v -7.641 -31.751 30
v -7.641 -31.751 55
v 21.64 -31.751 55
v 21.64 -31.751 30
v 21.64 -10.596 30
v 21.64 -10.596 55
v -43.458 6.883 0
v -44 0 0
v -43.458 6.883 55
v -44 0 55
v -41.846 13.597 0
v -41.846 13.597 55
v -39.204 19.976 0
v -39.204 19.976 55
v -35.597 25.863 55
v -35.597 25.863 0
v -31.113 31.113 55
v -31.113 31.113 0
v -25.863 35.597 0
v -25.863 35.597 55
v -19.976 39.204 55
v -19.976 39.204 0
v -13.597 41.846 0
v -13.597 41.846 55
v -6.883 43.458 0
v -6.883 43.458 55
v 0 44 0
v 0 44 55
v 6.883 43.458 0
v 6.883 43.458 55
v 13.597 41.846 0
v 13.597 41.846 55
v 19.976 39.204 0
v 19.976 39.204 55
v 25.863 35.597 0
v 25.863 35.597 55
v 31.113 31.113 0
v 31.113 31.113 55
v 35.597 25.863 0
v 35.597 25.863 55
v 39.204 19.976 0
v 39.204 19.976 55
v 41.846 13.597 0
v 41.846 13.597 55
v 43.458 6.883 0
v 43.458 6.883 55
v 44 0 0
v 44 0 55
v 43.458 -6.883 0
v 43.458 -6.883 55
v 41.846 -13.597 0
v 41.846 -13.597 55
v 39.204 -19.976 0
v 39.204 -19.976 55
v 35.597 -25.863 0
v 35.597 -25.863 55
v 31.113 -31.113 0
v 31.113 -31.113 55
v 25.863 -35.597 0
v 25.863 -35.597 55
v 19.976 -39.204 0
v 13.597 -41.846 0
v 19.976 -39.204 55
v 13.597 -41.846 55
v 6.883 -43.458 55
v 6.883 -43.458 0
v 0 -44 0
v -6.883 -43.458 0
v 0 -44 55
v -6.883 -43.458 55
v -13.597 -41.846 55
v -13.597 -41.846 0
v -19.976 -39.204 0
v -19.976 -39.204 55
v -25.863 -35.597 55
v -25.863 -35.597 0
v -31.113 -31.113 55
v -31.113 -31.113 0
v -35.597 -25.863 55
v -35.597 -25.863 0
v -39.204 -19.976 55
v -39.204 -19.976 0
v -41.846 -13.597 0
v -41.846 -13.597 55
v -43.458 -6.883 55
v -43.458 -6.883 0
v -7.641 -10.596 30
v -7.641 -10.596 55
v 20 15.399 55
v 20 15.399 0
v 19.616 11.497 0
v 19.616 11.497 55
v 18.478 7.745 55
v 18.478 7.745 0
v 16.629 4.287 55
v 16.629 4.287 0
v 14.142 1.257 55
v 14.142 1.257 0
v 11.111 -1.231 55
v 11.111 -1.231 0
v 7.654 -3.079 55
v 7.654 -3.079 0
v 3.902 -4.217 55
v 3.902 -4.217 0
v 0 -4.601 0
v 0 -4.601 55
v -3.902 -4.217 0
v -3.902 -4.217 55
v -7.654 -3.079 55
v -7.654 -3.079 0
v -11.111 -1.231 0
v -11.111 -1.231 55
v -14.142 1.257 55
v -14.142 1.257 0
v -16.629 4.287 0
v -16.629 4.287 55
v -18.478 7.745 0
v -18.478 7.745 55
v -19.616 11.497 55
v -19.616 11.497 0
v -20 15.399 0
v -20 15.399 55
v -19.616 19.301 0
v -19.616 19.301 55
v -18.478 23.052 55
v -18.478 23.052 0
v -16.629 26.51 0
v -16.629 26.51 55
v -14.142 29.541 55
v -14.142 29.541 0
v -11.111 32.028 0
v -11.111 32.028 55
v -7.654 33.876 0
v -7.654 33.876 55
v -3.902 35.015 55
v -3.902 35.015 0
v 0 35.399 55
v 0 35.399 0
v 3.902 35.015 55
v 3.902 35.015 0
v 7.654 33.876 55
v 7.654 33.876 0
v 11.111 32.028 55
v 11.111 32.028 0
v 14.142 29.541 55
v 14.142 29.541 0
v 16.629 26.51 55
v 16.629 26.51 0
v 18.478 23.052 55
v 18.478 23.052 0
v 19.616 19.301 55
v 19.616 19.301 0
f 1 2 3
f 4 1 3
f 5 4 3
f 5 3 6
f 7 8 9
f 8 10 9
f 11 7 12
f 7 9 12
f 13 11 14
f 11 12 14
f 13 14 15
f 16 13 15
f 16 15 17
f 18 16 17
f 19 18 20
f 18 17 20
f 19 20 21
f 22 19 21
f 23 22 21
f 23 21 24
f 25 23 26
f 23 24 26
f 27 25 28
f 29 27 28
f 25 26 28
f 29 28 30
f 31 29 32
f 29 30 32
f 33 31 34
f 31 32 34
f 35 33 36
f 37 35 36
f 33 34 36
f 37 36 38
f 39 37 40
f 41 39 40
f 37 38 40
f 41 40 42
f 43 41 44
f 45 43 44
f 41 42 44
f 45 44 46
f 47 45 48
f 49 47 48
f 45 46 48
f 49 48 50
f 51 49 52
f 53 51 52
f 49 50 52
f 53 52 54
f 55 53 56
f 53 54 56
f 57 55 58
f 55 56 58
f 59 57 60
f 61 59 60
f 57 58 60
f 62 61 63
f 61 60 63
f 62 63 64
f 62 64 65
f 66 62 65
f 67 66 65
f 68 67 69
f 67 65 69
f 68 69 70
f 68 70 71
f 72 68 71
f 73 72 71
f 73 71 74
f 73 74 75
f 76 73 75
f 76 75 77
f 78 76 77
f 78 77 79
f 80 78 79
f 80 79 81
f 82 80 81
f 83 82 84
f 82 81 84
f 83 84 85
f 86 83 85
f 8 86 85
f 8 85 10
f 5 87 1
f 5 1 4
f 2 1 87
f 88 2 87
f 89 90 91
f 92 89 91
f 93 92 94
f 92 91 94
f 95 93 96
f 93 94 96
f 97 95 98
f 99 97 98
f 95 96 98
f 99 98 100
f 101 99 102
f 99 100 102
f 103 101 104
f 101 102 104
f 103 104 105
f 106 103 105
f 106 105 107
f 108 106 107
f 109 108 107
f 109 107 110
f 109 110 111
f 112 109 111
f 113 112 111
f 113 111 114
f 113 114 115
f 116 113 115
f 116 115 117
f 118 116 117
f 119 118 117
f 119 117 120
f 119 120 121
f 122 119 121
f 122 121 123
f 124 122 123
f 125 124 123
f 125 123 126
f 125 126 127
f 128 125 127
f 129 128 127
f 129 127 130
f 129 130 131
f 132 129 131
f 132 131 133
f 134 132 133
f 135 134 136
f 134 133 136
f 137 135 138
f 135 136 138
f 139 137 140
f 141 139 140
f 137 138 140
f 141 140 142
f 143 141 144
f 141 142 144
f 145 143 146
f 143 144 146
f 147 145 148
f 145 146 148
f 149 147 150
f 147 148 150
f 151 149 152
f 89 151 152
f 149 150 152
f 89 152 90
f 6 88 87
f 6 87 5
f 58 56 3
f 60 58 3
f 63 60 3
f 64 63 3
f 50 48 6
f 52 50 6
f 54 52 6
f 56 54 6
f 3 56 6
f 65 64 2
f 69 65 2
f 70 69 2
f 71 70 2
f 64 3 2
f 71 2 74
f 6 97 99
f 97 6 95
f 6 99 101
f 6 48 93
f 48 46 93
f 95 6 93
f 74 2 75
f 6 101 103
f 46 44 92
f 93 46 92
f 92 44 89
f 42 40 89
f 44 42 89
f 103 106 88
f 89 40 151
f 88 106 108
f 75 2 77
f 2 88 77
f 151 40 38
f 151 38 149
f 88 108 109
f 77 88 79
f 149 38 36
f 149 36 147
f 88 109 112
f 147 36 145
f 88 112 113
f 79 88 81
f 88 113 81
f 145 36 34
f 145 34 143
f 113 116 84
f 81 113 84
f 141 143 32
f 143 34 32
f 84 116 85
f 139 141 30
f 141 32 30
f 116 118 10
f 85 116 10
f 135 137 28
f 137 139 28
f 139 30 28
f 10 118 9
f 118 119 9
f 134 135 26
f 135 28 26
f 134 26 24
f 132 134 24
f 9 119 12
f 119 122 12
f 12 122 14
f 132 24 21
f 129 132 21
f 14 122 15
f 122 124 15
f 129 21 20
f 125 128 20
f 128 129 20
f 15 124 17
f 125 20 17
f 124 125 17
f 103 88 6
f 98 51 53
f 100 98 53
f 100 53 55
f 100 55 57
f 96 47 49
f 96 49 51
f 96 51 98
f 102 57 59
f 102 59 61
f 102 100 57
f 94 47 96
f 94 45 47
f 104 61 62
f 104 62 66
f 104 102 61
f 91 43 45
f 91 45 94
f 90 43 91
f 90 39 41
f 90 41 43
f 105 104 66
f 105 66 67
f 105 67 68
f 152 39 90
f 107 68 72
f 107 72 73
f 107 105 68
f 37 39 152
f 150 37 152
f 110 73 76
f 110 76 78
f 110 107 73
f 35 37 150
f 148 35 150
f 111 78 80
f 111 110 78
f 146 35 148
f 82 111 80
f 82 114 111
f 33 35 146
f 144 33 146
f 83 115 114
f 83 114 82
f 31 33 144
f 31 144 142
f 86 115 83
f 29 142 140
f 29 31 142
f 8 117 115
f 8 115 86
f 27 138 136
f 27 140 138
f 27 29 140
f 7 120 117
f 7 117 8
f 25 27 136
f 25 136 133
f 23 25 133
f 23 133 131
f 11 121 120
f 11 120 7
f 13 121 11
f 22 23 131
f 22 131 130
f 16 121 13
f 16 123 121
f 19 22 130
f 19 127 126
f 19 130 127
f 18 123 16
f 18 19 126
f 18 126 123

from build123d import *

# Parameters (mm, degrees)
F0_W     = 44
F0_H     = 55
F2_R     = 20
F3_DEPTH = 133.830428
F4_W     = 29.281278
F4_H     = 21.154624
F5_DEPTH = 25


with BuildPart() as f1:
    # F0 (on Front) → F1 (revolve)
    with BuildSketch(Plane.XZ):
        with Locations((-22, 27.5)):
            Rectangle(F0_W, F0_H)
    revolve(axis=Axis((0, 0, 27.5), (0, 0, -1)))

    # F2 (on face) → F3 (cut)
    with BuildSketch(Plane(origin=(0, 0, 0), x_dir=(1, 0, 0), z_dir=(0, 0, -1))):
        with Locations((0, -15.39881)):
            Circle(F2_R)
    extrude(amount=-F3_DEPTH, mode=Mode.SUBTRACT)

    # F4 (on face) → F5 (cut)
    with BuildSketch(Plane.XY.offset(55)):
        with Locations((6.999669, -21.173684)):
            Rectangle(F4_W, F4_H)
    extrude(amount=-F5_DEPTH, mode=Mode.SUBTRACT)


solid = f1.part
